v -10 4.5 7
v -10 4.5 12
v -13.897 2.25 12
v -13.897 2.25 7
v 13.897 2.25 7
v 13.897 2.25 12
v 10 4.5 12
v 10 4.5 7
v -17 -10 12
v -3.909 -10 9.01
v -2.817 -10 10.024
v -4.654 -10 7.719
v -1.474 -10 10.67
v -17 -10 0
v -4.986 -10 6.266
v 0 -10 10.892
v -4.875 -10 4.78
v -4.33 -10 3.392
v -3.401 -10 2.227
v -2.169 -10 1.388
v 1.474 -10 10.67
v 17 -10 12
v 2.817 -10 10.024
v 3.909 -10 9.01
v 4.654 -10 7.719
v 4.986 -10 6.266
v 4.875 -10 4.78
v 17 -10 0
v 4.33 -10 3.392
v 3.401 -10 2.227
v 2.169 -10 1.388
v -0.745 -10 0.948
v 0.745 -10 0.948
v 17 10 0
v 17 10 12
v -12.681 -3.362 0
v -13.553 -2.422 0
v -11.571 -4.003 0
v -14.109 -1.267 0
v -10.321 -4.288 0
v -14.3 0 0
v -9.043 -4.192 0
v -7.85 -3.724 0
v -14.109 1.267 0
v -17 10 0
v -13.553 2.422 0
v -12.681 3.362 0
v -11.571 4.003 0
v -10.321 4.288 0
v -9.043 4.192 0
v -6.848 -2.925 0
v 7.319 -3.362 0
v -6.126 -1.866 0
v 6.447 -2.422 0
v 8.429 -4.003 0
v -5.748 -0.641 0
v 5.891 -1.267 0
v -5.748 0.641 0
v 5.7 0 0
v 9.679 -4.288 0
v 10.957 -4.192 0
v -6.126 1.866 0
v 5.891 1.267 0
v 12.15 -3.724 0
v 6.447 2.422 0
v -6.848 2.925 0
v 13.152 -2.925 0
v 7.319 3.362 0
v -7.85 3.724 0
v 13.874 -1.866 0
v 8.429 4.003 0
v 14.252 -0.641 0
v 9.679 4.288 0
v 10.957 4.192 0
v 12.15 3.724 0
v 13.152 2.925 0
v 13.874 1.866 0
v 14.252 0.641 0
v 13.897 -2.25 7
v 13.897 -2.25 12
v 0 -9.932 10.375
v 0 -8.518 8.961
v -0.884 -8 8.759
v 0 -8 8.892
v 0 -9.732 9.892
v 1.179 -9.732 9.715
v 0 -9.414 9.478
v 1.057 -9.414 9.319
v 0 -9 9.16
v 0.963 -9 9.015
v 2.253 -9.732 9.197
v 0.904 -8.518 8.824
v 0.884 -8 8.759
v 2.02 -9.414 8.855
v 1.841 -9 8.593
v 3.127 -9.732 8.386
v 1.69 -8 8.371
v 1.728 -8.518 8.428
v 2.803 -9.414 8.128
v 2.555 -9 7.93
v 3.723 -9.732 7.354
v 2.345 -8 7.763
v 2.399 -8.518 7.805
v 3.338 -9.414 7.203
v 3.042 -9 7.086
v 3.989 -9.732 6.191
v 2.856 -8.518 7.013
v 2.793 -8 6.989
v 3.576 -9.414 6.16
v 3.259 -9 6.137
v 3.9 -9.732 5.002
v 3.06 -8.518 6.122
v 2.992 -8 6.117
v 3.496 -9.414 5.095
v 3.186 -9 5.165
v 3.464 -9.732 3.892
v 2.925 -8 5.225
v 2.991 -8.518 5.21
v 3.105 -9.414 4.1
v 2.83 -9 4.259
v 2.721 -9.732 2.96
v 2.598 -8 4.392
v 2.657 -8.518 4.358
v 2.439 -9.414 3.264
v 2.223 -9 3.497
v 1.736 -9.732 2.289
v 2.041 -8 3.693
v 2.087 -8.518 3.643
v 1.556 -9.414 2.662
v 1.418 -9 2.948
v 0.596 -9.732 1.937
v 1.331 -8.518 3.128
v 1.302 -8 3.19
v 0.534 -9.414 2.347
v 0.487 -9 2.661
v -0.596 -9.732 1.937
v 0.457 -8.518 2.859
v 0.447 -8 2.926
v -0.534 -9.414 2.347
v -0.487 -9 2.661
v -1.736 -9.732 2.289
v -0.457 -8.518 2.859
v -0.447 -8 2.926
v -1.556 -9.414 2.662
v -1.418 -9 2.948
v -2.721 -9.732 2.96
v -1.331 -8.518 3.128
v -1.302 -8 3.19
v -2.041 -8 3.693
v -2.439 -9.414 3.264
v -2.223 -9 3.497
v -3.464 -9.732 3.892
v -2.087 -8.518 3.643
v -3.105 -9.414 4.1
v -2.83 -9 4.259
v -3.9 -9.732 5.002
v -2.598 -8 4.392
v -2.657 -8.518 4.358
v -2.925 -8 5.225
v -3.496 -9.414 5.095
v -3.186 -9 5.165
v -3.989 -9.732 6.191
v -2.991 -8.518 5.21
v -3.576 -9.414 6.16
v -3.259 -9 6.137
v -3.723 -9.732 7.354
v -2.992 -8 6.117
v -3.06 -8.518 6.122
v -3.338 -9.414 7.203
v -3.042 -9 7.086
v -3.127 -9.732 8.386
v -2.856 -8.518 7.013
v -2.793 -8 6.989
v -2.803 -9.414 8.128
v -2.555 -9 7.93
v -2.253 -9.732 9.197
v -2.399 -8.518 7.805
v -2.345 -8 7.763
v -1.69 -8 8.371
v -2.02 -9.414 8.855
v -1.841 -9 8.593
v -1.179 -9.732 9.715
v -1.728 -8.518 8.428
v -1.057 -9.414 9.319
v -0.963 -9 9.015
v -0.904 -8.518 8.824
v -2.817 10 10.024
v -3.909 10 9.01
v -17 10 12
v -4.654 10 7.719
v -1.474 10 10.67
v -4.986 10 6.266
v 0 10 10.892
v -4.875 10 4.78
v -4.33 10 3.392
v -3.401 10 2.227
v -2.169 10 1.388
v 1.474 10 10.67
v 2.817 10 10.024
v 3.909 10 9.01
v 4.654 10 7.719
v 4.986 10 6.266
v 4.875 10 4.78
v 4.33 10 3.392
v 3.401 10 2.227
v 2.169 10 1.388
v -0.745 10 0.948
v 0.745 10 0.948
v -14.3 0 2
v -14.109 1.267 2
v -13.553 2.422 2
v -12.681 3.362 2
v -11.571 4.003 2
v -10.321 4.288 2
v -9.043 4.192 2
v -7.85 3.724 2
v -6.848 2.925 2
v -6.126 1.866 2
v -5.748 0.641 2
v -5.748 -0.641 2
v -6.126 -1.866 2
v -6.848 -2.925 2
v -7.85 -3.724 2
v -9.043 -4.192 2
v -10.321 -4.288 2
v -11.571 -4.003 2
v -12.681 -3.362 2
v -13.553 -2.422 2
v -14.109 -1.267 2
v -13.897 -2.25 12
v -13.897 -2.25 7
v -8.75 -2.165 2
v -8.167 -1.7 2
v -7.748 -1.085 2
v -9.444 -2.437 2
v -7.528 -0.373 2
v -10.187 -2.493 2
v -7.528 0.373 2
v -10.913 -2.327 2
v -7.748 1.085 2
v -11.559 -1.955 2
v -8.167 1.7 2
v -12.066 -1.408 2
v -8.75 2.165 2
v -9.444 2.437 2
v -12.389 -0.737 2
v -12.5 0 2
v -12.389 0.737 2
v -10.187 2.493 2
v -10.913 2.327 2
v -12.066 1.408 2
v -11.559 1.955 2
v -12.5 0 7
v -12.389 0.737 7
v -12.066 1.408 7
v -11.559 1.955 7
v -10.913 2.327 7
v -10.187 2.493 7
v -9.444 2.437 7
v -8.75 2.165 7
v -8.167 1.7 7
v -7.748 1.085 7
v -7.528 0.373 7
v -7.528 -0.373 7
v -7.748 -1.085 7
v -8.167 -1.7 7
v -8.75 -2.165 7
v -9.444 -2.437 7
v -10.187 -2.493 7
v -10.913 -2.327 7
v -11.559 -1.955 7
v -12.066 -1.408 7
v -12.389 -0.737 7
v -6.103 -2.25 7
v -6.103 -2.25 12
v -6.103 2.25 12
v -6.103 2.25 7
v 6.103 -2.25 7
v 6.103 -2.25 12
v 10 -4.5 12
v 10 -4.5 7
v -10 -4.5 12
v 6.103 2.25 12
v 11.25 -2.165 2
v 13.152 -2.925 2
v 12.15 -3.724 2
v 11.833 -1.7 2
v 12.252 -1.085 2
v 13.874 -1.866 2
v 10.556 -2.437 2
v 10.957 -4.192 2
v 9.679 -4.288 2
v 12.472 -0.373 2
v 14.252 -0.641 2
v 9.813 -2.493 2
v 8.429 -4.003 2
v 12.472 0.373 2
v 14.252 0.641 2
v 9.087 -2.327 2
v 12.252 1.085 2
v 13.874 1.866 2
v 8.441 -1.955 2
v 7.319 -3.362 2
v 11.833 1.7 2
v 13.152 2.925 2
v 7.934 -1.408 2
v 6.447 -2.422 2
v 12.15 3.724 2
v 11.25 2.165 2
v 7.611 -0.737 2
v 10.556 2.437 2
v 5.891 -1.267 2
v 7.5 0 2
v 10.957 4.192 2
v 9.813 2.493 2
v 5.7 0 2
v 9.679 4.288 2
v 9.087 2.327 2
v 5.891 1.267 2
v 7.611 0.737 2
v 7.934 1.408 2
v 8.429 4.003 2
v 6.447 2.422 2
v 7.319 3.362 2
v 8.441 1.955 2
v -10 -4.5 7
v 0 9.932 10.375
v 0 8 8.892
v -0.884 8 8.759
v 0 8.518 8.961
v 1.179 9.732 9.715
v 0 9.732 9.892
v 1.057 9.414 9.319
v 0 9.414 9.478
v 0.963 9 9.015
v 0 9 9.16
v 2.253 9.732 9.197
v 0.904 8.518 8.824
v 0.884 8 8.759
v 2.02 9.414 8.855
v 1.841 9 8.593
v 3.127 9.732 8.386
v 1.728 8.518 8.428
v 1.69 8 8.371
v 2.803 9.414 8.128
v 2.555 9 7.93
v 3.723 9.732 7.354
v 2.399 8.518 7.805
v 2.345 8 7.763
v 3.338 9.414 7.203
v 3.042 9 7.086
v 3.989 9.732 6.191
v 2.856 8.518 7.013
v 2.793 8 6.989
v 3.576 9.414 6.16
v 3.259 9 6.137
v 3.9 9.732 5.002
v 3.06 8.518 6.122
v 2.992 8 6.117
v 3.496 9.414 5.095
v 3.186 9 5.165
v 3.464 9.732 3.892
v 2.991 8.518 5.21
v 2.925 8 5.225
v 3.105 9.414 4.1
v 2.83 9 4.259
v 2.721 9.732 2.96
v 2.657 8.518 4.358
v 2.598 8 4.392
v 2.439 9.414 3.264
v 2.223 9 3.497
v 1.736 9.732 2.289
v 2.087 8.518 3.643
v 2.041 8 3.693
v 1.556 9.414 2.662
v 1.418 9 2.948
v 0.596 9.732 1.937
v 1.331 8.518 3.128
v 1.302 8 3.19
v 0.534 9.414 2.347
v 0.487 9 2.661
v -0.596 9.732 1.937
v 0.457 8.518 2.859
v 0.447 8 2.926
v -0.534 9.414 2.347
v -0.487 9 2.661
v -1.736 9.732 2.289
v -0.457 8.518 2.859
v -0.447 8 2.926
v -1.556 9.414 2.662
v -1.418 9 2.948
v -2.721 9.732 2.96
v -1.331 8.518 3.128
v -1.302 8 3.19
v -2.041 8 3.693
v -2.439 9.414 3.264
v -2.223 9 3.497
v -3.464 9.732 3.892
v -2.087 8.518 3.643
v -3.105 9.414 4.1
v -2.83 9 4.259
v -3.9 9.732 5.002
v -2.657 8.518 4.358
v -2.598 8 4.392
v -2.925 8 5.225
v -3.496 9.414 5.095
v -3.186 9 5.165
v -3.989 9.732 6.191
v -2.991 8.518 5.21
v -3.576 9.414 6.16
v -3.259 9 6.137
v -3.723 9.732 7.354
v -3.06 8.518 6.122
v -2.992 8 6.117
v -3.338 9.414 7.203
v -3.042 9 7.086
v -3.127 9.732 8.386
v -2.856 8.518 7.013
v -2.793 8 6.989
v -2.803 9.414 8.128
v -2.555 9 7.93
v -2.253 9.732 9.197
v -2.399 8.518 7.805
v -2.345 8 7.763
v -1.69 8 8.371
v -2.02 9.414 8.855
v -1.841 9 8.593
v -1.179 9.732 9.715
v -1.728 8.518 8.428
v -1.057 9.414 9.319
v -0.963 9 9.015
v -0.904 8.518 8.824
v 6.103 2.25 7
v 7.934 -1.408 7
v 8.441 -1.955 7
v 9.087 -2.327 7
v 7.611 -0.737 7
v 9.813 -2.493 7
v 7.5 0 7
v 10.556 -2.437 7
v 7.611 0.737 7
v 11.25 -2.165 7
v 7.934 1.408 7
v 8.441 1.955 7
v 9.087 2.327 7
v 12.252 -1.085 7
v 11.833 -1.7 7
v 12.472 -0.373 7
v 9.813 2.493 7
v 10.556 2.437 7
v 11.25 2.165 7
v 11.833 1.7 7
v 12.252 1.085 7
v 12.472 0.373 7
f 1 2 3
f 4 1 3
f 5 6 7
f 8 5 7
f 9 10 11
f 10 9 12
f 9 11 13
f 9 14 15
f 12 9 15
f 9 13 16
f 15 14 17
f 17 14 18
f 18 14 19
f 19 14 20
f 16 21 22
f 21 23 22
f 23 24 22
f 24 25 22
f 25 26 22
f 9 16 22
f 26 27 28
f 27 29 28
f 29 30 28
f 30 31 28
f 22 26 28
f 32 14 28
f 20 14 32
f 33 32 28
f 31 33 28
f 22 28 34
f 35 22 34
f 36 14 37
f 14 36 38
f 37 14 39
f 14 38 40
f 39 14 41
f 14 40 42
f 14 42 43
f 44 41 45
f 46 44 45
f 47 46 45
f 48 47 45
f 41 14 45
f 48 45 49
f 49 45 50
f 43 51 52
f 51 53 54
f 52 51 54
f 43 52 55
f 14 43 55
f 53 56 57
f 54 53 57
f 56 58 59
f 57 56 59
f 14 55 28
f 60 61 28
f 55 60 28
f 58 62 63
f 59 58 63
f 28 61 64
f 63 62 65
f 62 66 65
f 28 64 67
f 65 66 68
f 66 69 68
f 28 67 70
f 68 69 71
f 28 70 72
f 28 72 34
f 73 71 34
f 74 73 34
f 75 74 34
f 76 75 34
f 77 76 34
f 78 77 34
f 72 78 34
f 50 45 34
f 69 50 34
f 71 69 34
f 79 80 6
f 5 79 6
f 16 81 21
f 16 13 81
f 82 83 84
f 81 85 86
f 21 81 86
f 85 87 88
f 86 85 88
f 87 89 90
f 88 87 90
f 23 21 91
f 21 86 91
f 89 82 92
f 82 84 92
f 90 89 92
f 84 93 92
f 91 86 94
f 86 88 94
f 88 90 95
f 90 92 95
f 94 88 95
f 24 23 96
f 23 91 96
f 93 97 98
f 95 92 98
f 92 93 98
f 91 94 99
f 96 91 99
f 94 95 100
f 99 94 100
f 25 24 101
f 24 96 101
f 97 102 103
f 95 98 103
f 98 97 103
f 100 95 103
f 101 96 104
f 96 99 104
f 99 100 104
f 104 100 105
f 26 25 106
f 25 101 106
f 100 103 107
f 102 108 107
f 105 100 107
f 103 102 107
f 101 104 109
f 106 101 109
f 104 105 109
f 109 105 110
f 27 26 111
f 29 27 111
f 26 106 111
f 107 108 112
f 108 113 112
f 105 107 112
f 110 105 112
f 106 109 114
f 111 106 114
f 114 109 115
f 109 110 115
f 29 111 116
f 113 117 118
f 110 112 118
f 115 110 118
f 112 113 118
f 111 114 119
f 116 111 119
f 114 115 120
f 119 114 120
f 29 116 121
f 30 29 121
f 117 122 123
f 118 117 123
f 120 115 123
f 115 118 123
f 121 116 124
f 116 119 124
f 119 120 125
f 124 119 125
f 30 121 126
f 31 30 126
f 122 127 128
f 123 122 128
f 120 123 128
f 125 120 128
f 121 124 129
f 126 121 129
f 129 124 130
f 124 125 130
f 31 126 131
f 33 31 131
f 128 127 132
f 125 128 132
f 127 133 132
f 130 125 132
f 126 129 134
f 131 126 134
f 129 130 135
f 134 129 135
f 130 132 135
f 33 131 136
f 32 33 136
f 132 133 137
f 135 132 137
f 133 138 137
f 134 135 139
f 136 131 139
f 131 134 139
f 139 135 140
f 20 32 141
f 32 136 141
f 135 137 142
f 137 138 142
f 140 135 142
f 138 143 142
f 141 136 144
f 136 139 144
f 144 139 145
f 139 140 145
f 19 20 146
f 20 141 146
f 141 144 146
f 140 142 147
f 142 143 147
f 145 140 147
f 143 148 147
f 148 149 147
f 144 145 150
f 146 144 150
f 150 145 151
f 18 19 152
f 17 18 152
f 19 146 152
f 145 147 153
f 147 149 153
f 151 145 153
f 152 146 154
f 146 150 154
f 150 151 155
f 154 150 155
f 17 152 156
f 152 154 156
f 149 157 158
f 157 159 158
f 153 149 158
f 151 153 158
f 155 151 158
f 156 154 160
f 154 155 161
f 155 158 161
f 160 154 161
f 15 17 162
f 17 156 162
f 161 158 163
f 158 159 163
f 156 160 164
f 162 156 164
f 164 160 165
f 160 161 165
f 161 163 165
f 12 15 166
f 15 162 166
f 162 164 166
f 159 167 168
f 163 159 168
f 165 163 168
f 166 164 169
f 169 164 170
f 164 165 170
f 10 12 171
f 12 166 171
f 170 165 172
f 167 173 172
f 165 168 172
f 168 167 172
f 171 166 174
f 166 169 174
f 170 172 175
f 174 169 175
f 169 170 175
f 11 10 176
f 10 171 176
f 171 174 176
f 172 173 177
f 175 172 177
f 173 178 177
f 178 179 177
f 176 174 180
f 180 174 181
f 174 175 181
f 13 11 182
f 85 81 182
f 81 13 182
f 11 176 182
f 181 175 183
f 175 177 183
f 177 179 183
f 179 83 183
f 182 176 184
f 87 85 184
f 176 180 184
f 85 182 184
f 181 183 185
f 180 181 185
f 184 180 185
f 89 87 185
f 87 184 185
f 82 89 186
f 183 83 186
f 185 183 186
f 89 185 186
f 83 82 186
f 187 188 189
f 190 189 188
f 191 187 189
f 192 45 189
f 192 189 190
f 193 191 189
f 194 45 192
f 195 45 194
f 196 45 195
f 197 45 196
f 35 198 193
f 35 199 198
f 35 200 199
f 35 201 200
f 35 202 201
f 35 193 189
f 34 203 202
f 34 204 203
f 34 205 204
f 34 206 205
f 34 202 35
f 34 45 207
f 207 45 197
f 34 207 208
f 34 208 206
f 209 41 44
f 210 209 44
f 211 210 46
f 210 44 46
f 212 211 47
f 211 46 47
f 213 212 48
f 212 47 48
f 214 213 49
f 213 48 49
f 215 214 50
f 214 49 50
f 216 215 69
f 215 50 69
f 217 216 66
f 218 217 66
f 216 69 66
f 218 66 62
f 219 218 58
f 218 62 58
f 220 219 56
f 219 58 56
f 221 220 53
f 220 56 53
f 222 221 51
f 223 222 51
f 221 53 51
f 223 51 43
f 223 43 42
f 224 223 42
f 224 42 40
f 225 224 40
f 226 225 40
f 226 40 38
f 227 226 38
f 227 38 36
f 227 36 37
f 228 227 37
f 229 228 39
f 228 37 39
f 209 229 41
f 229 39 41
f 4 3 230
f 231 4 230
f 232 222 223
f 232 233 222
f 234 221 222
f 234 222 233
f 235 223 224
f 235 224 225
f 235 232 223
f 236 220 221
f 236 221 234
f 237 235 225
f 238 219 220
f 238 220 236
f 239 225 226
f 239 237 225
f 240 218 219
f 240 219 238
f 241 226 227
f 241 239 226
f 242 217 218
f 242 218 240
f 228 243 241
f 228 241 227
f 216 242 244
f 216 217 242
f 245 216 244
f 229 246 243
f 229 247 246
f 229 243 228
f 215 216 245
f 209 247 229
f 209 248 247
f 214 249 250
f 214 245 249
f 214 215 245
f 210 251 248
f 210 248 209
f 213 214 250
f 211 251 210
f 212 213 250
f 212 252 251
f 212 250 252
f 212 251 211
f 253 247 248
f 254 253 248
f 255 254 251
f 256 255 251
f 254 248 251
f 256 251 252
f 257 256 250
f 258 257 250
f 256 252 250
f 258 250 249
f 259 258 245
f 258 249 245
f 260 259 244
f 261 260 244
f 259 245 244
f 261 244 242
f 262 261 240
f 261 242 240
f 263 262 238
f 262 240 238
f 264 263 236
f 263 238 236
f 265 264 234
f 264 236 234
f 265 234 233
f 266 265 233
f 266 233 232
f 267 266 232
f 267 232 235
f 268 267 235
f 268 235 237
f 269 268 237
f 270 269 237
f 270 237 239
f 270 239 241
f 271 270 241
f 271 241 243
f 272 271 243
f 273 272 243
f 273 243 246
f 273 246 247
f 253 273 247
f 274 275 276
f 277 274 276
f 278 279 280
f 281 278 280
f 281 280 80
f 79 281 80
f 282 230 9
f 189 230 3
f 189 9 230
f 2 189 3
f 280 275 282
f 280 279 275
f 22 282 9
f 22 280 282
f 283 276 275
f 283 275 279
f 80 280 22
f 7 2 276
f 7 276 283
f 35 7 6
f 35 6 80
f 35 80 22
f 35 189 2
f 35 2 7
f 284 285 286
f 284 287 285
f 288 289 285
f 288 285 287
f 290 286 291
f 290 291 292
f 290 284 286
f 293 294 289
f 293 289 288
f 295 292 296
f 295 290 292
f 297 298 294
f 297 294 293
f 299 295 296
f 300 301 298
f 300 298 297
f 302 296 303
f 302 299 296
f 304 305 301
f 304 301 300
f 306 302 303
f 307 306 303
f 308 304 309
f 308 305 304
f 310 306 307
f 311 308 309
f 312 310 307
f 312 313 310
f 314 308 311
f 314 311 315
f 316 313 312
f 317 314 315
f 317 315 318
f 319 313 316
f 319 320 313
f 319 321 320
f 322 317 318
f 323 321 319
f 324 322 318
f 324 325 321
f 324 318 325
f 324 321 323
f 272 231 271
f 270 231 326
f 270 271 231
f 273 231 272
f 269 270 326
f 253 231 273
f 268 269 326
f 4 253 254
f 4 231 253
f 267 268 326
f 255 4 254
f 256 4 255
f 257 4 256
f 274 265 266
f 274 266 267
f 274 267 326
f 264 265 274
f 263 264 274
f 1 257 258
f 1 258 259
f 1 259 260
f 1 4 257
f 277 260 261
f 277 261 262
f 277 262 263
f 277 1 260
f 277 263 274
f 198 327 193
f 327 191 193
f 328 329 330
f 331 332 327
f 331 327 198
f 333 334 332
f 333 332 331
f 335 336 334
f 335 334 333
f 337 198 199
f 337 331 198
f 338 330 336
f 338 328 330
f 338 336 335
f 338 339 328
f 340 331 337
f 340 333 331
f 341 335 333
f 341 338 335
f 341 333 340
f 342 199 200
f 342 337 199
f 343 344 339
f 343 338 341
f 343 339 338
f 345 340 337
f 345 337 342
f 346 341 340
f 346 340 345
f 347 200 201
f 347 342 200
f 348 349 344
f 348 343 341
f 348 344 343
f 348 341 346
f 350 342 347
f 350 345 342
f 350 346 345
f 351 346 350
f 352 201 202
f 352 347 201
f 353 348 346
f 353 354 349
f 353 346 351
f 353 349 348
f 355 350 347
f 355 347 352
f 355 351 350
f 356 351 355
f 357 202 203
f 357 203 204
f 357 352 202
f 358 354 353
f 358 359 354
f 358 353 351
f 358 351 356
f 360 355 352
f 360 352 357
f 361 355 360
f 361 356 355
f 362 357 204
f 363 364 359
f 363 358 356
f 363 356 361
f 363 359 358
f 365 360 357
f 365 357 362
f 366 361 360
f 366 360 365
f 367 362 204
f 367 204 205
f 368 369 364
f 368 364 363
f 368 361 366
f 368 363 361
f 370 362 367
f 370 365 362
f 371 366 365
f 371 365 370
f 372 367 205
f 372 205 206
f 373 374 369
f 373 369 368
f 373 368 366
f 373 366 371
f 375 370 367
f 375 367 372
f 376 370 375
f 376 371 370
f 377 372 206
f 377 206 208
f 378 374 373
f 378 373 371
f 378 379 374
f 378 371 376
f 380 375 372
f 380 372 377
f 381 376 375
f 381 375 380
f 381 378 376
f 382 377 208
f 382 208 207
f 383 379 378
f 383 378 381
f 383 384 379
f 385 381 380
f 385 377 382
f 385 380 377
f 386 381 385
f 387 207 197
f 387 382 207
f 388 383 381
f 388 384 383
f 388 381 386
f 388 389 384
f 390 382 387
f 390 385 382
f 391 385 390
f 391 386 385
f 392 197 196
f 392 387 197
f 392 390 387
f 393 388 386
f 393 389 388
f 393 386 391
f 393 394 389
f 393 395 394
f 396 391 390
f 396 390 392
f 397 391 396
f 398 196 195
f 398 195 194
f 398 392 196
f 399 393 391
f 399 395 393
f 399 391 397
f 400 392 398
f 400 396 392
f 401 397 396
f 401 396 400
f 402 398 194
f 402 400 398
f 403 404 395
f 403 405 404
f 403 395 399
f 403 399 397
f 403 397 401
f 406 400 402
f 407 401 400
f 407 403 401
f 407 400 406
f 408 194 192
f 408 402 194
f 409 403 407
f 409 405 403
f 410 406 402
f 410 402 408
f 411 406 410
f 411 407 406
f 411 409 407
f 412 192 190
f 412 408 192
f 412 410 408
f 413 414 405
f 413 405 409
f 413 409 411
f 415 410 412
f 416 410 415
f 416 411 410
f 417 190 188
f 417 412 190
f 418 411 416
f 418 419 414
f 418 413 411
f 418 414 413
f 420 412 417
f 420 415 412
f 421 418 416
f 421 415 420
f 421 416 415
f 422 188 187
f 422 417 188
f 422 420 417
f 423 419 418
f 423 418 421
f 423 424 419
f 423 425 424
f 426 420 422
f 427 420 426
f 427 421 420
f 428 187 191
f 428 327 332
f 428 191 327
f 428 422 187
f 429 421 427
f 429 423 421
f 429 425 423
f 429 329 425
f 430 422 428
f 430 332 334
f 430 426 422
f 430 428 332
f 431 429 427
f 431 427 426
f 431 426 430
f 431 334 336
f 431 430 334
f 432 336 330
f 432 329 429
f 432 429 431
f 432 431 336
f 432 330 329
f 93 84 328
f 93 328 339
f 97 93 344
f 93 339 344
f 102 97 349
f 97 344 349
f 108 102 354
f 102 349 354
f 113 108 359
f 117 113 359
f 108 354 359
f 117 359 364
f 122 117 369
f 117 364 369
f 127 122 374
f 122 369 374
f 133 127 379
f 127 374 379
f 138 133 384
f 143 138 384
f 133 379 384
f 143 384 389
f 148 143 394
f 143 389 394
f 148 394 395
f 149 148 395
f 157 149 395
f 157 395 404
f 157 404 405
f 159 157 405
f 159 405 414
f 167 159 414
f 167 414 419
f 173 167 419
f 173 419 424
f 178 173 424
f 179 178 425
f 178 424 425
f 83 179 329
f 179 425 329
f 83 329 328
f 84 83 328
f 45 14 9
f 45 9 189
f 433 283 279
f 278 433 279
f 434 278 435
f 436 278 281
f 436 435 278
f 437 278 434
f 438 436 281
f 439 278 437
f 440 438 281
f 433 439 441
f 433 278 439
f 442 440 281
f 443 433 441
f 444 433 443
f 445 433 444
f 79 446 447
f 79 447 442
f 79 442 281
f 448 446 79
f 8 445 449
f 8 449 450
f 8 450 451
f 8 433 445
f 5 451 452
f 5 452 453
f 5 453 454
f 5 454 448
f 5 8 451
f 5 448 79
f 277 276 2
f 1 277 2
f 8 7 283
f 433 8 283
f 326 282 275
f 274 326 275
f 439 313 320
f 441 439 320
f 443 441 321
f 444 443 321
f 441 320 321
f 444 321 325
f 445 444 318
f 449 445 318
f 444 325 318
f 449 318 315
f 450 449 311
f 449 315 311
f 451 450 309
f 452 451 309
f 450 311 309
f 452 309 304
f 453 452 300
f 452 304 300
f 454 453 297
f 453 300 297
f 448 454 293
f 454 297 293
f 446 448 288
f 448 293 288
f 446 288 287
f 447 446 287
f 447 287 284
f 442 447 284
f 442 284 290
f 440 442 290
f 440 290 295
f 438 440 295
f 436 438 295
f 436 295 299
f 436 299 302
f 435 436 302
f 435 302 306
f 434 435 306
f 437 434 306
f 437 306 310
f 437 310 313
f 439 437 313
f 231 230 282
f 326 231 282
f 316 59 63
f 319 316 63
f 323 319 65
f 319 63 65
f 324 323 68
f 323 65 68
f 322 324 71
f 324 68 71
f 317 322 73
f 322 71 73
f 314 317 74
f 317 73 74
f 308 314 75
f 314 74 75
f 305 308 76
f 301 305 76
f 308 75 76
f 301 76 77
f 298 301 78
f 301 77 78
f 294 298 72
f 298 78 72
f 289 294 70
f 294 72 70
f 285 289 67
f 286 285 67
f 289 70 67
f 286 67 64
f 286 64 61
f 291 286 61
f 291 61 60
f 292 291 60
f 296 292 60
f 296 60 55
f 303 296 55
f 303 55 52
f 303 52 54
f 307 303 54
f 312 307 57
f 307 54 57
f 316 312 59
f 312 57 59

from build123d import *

# Parameters (mm, degrees)
SKETCH1_W           = 34
SKETCH1_H           = 20
BOSS_EXTRUDE1_DEPTH = 12
SKETCH2_R           = 2.5
CUT_EXTRUDE5_DEPTH  = 12
SKETCH2_8_R         = 4.3
SKETCH2_8_R_2       = 2.5
CUT_EXTRUDE6_DEPTH  = 2
SKETCH6_R           = 3
CUT_EXTRUDE7_DEPTH  = 20
FILLET1_R           = 2
CUT_EXTRUDE8_DEPTH  = 5


with BuildPart() as part:
    # Sketch1 → Boss-Extrude1 (new body)
    with BuildSketch(Plane.XY):
        Rectangle(SKETCH1_W, SKETCH1_H)
    extrude(amount=BOSS_EXTRUDE1_DEPTH)

    # Sketch2 → Cut-Extrude5 (cut)
    with BuildSketch(Plane(origin=(0, 0, 0), x_dir=(-1, 0, 0), z_dir=(0, 0, -1))):
        with Locations((10, 0)):
            Circle(SKETCH2_R)
        with Locations((-10, 0)):
            Circle(SKETCH2_R)
    extrude(amount=-CUT_EXTRUDE5_DEPTH, mode=Mode.SUBTRACT)

    # Sketch2<8> → Cut-Extrude6 (cut)
    # profile 1 of 2: a face of its own
    with BuildSketch(Plane(origin=(0, 0, 0), x_dir=(-1, 0, 0), z_dir=(0, 0, -1))):
        with Locations((10, 0)):
            Circle(SKETCH2_8_R)
        with Locations((10, 0)):
            Circle(SKETCH2_8_R_2, mode=Mode.SUBTRACT)
    # profile 2 of 2: a face of its own
    with BuildSketch(Plane(origin=(0, 0, 0), x_dir=(-1, 0, 0), z_dir=(0, 0, -1))):
        with Locations((-10, 0)):
            Circle(SKETCH2_8_R)
        with Locations((-10, 0)):
            Circle(SKETCH2_8_R_2, mode=Mode.SUBTRACT)
    extrude(amount=-CUT_EXTRUDE6_DEPTH, mode=Mode.SUBTRACT)

    # Sketch6 → Cut-Extrude7 (cut)
    with BuildSketch(Plane(origin=(0, 10, 0), x_dir=(1, 0, 0), z_dir=(0, 1, 0))):
        with Locations(Location((0, -5.892499296, 0), (0, 0, 270))):
            Circle(SKETCH6_R)
    extrude(amount=-CUT_EXTRUDE7_DEPTH, mode=Mode.SUBTRACT)

    # Fillet1
    fillet1_edges = [part.edges().sort_by_distance(p)[0] for p in [
        (0, 10, 2.892499296),
        (0, -10, 2.892499296),
    ]]
    fillet(fillet1_edges, radius=FILLET1_R)

    # Sketch7 → Cut-Extrude8 (cut)
    with BuildSketch(Plane.XY.offset(12)):
        Polygon((-10, 4.5), (-13.897114317, 2.25), (-13.897114317, -2.25), (-10, -4.5), (-6.102885683, -2.25), (-6.102885683, 2.25), align=None)
        Polygon((10, 4.5), (6.102885683, 2.25), (6.102885683, -2.25), (10, -4.5), (13.897114317, -2.25), (13.897114317, 2.25), align=None)
    extrude(amount=-CUT_EXTRUDE8_DEPTH, mode=Mode.SUBTRACT)


solid = part.part
